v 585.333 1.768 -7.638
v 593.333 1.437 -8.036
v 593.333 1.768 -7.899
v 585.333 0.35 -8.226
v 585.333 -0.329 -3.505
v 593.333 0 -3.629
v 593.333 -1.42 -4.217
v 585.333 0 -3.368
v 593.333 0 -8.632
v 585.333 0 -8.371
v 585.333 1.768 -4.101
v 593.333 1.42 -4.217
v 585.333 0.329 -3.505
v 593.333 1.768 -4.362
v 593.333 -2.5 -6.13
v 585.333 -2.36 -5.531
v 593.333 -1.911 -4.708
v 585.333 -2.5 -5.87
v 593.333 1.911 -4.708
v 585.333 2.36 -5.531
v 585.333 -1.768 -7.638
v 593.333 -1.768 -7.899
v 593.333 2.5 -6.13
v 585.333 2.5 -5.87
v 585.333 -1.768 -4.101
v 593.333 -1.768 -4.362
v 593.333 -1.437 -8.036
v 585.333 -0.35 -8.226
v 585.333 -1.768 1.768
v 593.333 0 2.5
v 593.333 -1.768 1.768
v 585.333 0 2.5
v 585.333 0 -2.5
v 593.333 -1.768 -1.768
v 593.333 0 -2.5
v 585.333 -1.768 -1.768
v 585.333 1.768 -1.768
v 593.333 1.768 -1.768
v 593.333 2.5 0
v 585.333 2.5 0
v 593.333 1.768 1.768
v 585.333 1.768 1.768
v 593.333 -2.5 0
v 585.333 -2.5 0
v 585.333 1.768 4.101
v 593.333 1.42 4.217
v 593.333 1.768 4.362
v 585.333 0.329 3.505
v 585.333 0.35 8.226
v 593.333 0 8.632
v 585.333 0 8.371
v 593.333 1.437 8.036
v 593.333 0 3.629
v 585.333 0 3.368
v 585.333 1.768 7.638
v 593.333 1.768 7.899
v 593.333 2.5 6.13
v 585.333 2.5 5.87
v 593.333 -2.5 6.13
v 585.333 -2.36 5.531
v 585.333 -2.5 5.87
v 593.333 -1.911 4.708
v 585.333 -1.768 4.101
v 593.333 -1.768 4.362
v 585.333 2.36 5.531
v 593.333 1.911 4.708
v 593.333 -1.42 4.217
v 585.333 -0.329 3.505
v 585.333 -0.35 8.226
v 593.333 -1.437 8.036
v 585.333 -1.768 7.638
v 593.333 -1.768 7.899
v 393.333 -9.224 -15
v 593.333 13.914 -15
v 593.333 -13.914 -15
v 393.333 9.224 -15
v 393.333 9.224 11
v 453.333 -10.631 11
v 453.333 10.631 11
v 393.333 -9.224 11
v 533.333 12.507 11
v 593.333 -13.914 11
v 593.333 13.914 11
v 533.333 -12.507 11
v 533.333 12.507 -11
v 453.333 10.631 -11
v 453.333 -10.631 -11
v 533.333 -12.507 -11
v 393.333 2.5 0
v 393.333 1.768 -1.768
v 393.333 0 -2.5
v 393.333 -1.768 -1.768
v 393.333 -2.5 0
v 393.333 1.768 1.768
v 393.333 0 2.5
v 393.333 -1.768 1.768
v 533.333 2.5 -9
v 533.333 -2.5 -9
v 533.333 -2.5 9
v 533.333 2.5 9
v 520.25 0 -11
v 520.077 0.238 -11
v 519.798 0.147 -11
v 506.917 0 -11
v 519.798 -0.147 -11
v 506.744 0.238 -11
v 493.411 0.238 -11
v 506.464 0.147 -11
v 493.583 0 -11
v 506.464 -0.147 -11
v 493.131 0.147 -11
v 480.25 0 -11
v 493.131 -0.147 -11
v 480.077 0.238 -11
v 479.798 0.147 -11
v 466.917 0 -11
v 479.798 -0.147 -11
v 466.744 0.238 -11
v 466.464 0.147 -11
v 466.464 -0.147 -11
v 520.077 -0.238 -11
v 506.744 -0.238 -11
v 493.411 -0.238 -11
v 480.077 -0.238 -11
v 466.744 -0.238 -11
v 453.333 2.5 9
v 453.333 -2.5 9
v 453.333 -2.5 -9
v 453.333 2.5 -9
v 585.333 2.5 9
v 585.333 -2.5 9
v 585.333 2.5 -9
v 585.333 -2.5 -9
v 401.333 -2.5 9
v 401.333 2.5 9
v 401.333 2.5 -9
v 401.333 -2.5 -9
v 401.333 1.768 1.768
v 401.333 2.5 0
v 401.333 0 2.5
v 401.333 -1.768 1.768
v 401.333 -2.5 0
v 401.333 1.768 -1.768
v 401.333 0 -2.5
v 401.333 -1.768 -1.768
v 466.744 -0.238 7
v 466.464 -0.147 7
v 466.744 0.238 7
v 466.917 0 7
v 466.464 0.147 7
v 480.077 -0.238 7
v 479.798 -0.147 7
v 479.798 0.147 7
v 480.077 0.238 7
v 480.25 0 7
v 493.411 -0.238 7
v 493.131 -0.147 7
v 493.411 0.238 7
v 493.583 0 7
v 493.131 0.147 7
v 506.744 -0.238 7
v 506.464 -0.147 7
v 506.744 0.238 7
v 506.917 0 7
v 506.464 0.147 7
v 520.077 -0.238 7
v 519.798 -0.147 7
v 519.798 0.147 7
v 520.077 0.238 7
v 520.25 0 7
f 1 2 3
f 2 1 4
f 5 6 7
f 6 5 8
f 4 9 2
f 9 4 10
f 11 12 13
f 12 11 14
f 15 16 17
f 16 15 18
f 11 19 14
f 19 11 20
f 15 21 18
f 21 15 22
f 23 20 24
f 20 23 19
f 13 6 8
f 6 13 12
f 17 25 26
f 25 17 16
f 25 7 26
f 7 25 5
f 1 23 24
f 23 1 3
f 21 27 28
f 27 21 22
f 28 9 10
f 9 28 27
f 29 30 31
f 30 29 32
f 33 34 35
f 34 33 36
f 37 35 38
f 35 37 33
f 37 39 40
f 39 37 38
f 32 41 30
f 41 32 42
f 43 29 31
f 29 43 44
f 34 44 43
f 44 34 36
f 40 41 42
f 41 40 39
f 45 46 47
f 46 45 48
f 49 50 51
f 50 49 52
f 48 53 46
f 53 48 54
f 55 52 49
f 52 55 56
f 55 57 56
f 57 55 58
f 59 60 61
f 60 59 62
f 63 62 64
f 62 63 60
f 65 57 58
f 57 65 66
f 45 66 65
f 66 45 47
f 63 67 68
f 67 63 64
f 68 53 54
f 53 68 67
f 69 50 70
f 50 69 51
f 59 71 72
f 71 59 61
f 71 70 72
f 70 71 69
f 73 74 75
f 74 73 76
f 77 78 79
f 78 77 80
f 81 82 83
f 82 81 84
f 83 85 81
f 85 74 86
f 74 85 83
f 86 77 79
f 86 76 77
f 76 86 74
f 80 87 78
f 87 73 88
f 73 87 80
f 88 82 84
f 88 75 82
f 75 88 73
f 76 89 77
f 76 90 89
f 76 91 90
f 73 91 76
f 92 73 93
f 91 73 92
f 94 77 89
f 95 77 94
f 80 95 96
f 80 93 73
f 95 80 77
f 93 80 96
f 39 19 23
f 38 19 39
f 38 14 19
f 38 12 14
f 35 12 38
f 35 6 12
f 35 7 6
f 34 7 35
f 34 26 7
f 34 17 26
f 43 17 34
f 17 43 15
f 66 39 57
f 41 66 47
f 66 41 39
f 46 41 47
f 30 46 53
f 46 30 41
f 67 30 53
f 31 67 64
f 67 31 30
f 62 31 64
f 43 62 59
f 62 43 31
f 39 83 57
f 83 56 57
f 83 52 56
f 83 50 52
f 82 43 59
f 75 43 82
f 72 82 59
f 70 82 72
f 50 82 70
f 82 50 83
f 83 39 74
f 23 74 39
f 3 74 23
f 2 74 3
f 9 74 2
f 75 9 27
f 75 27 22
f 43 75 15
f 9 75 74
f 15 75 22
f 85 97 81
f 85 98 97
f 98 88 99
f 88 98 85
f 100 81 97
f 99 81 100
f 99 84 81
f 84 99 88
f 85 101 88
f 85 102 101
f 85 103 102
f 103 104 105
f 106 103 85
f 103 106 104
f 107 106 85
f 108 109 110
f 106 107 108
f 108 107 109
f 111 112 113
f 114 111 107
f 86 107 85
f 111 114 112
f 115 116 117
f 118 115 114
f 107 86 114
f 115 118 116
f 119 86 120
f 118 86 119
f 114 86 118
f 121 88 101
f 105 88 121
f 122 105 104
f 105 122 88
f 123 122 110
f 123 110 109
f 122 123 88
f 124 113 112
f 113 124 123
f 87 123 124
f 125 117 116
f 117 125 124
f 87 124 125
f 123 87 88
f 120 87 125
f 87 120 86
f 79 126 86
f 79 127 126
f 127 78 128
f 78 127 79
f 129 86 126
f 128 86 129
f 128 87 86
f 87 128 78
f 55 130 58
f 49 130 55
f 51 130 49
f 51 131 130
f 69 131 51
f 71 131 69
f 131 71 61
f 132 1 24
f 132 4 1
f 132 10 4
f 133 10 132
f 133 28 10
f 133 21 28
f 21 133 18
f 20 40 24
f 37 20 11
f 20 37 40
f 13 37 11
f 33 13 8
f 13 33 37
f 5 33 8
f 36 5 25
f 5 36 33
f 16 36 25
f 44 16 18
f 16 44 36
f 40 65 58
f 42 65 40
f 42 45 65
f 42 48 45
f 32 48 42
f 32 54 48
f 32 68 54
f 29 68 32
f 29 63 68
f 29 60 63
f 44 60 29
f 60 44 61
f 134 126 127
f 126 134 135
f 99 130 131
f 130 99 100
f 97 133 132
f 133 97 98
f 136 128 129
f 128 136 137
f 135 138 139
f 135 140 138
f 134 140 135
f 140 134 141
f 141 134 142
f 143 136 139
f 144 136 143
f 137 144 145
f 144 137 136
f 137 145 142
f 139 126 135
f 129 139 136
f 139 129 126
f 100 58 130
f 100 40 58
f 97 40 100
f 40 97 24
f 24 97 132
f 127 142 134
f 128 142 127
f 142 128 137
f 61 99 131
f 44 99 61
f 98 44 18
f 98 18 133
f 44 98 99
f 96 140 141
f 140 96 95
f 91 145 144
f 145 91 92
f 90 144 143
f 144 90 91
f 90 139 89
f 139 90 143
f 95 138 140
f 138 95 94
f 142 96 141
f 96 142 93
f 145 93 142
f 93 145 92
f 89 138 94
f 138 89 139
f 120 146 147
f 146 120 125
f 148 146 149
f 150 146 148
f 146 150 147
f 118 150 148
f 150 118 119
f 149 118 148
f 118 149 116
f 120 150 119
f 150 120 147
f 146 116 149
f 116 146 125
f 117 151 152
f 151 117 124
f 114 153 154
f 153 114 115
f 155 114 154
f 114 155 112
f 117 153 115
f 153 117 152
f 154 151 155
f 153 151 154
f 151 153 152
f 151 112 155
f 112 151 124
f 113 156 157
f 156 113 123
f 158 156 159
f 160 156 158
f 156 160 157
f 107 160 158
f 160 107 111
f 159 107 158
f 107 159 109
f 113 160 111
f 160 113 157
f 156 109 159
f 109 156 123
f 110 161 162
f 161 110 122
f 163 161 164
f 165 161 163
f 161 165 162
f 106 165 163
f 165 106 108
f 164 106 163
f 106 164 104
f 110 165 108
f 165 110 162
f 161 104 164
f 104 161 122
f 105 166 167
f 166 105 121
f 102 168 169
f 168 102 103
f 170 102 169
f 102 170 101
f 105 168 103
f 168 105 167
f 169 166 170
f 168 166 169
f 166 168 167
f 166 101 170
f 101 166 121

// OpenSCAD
e = 4 ; // epaisseur du socle
led_d = 5 ; // diametre led
led_h = 8 ; // hauteur led
photo_d = led_d ; // diametre phototransistor
photo_d2 = photo_d + 1  ; // diametre encombrement phototransistor
photo_h = led_h ; // hauteur phototransistor ;
corde_r = 800 ; // rayon d'une corde
corde_jeu2 = 2 * corde_r / 3 ; // aire du jeu
corde_jeu1 = corde_jeu2 - 80 ; // aire du jeu
corde_a = asin(25/corde_jeu2) ; // angle entre les cordes
corde_tunnel = 60 ; // longueur tunnel noir
corde_led = corde_jeu1 - corde_tunnel ; // position debut led emitrice
corde_photo = corde_jeu2 + corde_tunnel  ; // position fin phototransistors
corde_lumiere = corde_photo - corde_led - led_h - photo_h ; // longueur tunne de lumiere
corde_lumiere_dx = corde_lumiere/2 + corde_led + led_h; // position tunnel de lumiere
photo_nb = 3 ;
photo_z = photo_d2 * photo_nb ; // hauteur tunnel phottransistors
corde_h = photo_z + e ; // hauteur d'une corde
fil_d = 0.5 ; // diametre du fil tactile
fil_nb = 5 ;
fil_dy = ((corde_jeu2 - corde_jeu1 ) / fil_nb ) / 2 ; // decalage des deux fils

corde_nb = 4;

module corde()
{

    difference() 
    {

       // cylindre complet
       translate([0,0,-e/2])
             cylinder(r=corde_r,h=corde_h + e, center = true);
       // couper pour faire un camenbert
       rotate([0,0,corde_a/2])
             translate([0,corde_r/2,0])
                 cube([2*corde_r,corde_r,corde_h + 2*e],center = true);
       rotate([0,0,-corde_a/2])
             translate([0,-corde_r/2,0])
                 cube([2*corde_r,corde_r,corde_h + 2*e],center = true);
    
        
       // couper les pointes pour avoir la section qui contient les leds et photo
       translate([-corde_r + corde_led,0 ,0])
           cube([2*corde_r,2*corde_r,corde_h+2*e],center = true);
       translate([corde_r + corde_photo,0])
           cube([2*corde_r,2*corde_r,corde_h+2*e],center = true);
   
    
       // couper pour avoir la section de jeu
       translate([(corde_jeu2 - corde_jeu1)/2 + corde_jeu1  ,0,0])
           cube([corde_jeu2 - corde_jeu1,2*corde_r,corde_h],center = true);

       // percer pour le tunnel de lumiere
       translate([corde_lumiere_dx,0,0])
           cube([corde_lumiere ,photo_d,photo_z],center = true);
           
       // percer led
       translate([corde_led + led_h / 2, 0,0])
           rotate([0,90,0])
                cylinder(d=led_d,h=led_h,center = true);

       // percer phototransistor
       for(i = [1:photo_nb])
       {
           si = i - (photo_nb + 1)/ 2 ;
           echo("si=",si);
           dz =  photo_d2 * si ;
           echo("dz=",dz);
           da = atan(dz / corde_lumiere ) * si * ((si < 0)?1:-1) ;
           echo("da=",da);
           translate([corde_photo - photo_h / 2 , 0 , dz ])
               rotate([0,90 + da ,0])
                   cylinder(d=photo_d,h=photo_h + 5,center = true);
       }
    }

       // fils tactile
    for(f=[1:fil_nb])
    {
       translate([corde_jeu1 + f * (corde_jeu2 - corde_jeu1 )/ (fil_nb + 1) ,0 ,-e])
           cylinder(d=fil_d , h=photo_z + e  ,center = true);
    }
}
module cordes() {
    for(a = [0 : corde_a : (corde_a * ( corde_nb - 1) ) ]) 
    {
        echo ( a ) ;
            rotate([0,0,a])
                corde();
    }
}

difference()
{
    corde();
    *translate([0,200,0])
        cube([4000,400,400],center = true);
}
